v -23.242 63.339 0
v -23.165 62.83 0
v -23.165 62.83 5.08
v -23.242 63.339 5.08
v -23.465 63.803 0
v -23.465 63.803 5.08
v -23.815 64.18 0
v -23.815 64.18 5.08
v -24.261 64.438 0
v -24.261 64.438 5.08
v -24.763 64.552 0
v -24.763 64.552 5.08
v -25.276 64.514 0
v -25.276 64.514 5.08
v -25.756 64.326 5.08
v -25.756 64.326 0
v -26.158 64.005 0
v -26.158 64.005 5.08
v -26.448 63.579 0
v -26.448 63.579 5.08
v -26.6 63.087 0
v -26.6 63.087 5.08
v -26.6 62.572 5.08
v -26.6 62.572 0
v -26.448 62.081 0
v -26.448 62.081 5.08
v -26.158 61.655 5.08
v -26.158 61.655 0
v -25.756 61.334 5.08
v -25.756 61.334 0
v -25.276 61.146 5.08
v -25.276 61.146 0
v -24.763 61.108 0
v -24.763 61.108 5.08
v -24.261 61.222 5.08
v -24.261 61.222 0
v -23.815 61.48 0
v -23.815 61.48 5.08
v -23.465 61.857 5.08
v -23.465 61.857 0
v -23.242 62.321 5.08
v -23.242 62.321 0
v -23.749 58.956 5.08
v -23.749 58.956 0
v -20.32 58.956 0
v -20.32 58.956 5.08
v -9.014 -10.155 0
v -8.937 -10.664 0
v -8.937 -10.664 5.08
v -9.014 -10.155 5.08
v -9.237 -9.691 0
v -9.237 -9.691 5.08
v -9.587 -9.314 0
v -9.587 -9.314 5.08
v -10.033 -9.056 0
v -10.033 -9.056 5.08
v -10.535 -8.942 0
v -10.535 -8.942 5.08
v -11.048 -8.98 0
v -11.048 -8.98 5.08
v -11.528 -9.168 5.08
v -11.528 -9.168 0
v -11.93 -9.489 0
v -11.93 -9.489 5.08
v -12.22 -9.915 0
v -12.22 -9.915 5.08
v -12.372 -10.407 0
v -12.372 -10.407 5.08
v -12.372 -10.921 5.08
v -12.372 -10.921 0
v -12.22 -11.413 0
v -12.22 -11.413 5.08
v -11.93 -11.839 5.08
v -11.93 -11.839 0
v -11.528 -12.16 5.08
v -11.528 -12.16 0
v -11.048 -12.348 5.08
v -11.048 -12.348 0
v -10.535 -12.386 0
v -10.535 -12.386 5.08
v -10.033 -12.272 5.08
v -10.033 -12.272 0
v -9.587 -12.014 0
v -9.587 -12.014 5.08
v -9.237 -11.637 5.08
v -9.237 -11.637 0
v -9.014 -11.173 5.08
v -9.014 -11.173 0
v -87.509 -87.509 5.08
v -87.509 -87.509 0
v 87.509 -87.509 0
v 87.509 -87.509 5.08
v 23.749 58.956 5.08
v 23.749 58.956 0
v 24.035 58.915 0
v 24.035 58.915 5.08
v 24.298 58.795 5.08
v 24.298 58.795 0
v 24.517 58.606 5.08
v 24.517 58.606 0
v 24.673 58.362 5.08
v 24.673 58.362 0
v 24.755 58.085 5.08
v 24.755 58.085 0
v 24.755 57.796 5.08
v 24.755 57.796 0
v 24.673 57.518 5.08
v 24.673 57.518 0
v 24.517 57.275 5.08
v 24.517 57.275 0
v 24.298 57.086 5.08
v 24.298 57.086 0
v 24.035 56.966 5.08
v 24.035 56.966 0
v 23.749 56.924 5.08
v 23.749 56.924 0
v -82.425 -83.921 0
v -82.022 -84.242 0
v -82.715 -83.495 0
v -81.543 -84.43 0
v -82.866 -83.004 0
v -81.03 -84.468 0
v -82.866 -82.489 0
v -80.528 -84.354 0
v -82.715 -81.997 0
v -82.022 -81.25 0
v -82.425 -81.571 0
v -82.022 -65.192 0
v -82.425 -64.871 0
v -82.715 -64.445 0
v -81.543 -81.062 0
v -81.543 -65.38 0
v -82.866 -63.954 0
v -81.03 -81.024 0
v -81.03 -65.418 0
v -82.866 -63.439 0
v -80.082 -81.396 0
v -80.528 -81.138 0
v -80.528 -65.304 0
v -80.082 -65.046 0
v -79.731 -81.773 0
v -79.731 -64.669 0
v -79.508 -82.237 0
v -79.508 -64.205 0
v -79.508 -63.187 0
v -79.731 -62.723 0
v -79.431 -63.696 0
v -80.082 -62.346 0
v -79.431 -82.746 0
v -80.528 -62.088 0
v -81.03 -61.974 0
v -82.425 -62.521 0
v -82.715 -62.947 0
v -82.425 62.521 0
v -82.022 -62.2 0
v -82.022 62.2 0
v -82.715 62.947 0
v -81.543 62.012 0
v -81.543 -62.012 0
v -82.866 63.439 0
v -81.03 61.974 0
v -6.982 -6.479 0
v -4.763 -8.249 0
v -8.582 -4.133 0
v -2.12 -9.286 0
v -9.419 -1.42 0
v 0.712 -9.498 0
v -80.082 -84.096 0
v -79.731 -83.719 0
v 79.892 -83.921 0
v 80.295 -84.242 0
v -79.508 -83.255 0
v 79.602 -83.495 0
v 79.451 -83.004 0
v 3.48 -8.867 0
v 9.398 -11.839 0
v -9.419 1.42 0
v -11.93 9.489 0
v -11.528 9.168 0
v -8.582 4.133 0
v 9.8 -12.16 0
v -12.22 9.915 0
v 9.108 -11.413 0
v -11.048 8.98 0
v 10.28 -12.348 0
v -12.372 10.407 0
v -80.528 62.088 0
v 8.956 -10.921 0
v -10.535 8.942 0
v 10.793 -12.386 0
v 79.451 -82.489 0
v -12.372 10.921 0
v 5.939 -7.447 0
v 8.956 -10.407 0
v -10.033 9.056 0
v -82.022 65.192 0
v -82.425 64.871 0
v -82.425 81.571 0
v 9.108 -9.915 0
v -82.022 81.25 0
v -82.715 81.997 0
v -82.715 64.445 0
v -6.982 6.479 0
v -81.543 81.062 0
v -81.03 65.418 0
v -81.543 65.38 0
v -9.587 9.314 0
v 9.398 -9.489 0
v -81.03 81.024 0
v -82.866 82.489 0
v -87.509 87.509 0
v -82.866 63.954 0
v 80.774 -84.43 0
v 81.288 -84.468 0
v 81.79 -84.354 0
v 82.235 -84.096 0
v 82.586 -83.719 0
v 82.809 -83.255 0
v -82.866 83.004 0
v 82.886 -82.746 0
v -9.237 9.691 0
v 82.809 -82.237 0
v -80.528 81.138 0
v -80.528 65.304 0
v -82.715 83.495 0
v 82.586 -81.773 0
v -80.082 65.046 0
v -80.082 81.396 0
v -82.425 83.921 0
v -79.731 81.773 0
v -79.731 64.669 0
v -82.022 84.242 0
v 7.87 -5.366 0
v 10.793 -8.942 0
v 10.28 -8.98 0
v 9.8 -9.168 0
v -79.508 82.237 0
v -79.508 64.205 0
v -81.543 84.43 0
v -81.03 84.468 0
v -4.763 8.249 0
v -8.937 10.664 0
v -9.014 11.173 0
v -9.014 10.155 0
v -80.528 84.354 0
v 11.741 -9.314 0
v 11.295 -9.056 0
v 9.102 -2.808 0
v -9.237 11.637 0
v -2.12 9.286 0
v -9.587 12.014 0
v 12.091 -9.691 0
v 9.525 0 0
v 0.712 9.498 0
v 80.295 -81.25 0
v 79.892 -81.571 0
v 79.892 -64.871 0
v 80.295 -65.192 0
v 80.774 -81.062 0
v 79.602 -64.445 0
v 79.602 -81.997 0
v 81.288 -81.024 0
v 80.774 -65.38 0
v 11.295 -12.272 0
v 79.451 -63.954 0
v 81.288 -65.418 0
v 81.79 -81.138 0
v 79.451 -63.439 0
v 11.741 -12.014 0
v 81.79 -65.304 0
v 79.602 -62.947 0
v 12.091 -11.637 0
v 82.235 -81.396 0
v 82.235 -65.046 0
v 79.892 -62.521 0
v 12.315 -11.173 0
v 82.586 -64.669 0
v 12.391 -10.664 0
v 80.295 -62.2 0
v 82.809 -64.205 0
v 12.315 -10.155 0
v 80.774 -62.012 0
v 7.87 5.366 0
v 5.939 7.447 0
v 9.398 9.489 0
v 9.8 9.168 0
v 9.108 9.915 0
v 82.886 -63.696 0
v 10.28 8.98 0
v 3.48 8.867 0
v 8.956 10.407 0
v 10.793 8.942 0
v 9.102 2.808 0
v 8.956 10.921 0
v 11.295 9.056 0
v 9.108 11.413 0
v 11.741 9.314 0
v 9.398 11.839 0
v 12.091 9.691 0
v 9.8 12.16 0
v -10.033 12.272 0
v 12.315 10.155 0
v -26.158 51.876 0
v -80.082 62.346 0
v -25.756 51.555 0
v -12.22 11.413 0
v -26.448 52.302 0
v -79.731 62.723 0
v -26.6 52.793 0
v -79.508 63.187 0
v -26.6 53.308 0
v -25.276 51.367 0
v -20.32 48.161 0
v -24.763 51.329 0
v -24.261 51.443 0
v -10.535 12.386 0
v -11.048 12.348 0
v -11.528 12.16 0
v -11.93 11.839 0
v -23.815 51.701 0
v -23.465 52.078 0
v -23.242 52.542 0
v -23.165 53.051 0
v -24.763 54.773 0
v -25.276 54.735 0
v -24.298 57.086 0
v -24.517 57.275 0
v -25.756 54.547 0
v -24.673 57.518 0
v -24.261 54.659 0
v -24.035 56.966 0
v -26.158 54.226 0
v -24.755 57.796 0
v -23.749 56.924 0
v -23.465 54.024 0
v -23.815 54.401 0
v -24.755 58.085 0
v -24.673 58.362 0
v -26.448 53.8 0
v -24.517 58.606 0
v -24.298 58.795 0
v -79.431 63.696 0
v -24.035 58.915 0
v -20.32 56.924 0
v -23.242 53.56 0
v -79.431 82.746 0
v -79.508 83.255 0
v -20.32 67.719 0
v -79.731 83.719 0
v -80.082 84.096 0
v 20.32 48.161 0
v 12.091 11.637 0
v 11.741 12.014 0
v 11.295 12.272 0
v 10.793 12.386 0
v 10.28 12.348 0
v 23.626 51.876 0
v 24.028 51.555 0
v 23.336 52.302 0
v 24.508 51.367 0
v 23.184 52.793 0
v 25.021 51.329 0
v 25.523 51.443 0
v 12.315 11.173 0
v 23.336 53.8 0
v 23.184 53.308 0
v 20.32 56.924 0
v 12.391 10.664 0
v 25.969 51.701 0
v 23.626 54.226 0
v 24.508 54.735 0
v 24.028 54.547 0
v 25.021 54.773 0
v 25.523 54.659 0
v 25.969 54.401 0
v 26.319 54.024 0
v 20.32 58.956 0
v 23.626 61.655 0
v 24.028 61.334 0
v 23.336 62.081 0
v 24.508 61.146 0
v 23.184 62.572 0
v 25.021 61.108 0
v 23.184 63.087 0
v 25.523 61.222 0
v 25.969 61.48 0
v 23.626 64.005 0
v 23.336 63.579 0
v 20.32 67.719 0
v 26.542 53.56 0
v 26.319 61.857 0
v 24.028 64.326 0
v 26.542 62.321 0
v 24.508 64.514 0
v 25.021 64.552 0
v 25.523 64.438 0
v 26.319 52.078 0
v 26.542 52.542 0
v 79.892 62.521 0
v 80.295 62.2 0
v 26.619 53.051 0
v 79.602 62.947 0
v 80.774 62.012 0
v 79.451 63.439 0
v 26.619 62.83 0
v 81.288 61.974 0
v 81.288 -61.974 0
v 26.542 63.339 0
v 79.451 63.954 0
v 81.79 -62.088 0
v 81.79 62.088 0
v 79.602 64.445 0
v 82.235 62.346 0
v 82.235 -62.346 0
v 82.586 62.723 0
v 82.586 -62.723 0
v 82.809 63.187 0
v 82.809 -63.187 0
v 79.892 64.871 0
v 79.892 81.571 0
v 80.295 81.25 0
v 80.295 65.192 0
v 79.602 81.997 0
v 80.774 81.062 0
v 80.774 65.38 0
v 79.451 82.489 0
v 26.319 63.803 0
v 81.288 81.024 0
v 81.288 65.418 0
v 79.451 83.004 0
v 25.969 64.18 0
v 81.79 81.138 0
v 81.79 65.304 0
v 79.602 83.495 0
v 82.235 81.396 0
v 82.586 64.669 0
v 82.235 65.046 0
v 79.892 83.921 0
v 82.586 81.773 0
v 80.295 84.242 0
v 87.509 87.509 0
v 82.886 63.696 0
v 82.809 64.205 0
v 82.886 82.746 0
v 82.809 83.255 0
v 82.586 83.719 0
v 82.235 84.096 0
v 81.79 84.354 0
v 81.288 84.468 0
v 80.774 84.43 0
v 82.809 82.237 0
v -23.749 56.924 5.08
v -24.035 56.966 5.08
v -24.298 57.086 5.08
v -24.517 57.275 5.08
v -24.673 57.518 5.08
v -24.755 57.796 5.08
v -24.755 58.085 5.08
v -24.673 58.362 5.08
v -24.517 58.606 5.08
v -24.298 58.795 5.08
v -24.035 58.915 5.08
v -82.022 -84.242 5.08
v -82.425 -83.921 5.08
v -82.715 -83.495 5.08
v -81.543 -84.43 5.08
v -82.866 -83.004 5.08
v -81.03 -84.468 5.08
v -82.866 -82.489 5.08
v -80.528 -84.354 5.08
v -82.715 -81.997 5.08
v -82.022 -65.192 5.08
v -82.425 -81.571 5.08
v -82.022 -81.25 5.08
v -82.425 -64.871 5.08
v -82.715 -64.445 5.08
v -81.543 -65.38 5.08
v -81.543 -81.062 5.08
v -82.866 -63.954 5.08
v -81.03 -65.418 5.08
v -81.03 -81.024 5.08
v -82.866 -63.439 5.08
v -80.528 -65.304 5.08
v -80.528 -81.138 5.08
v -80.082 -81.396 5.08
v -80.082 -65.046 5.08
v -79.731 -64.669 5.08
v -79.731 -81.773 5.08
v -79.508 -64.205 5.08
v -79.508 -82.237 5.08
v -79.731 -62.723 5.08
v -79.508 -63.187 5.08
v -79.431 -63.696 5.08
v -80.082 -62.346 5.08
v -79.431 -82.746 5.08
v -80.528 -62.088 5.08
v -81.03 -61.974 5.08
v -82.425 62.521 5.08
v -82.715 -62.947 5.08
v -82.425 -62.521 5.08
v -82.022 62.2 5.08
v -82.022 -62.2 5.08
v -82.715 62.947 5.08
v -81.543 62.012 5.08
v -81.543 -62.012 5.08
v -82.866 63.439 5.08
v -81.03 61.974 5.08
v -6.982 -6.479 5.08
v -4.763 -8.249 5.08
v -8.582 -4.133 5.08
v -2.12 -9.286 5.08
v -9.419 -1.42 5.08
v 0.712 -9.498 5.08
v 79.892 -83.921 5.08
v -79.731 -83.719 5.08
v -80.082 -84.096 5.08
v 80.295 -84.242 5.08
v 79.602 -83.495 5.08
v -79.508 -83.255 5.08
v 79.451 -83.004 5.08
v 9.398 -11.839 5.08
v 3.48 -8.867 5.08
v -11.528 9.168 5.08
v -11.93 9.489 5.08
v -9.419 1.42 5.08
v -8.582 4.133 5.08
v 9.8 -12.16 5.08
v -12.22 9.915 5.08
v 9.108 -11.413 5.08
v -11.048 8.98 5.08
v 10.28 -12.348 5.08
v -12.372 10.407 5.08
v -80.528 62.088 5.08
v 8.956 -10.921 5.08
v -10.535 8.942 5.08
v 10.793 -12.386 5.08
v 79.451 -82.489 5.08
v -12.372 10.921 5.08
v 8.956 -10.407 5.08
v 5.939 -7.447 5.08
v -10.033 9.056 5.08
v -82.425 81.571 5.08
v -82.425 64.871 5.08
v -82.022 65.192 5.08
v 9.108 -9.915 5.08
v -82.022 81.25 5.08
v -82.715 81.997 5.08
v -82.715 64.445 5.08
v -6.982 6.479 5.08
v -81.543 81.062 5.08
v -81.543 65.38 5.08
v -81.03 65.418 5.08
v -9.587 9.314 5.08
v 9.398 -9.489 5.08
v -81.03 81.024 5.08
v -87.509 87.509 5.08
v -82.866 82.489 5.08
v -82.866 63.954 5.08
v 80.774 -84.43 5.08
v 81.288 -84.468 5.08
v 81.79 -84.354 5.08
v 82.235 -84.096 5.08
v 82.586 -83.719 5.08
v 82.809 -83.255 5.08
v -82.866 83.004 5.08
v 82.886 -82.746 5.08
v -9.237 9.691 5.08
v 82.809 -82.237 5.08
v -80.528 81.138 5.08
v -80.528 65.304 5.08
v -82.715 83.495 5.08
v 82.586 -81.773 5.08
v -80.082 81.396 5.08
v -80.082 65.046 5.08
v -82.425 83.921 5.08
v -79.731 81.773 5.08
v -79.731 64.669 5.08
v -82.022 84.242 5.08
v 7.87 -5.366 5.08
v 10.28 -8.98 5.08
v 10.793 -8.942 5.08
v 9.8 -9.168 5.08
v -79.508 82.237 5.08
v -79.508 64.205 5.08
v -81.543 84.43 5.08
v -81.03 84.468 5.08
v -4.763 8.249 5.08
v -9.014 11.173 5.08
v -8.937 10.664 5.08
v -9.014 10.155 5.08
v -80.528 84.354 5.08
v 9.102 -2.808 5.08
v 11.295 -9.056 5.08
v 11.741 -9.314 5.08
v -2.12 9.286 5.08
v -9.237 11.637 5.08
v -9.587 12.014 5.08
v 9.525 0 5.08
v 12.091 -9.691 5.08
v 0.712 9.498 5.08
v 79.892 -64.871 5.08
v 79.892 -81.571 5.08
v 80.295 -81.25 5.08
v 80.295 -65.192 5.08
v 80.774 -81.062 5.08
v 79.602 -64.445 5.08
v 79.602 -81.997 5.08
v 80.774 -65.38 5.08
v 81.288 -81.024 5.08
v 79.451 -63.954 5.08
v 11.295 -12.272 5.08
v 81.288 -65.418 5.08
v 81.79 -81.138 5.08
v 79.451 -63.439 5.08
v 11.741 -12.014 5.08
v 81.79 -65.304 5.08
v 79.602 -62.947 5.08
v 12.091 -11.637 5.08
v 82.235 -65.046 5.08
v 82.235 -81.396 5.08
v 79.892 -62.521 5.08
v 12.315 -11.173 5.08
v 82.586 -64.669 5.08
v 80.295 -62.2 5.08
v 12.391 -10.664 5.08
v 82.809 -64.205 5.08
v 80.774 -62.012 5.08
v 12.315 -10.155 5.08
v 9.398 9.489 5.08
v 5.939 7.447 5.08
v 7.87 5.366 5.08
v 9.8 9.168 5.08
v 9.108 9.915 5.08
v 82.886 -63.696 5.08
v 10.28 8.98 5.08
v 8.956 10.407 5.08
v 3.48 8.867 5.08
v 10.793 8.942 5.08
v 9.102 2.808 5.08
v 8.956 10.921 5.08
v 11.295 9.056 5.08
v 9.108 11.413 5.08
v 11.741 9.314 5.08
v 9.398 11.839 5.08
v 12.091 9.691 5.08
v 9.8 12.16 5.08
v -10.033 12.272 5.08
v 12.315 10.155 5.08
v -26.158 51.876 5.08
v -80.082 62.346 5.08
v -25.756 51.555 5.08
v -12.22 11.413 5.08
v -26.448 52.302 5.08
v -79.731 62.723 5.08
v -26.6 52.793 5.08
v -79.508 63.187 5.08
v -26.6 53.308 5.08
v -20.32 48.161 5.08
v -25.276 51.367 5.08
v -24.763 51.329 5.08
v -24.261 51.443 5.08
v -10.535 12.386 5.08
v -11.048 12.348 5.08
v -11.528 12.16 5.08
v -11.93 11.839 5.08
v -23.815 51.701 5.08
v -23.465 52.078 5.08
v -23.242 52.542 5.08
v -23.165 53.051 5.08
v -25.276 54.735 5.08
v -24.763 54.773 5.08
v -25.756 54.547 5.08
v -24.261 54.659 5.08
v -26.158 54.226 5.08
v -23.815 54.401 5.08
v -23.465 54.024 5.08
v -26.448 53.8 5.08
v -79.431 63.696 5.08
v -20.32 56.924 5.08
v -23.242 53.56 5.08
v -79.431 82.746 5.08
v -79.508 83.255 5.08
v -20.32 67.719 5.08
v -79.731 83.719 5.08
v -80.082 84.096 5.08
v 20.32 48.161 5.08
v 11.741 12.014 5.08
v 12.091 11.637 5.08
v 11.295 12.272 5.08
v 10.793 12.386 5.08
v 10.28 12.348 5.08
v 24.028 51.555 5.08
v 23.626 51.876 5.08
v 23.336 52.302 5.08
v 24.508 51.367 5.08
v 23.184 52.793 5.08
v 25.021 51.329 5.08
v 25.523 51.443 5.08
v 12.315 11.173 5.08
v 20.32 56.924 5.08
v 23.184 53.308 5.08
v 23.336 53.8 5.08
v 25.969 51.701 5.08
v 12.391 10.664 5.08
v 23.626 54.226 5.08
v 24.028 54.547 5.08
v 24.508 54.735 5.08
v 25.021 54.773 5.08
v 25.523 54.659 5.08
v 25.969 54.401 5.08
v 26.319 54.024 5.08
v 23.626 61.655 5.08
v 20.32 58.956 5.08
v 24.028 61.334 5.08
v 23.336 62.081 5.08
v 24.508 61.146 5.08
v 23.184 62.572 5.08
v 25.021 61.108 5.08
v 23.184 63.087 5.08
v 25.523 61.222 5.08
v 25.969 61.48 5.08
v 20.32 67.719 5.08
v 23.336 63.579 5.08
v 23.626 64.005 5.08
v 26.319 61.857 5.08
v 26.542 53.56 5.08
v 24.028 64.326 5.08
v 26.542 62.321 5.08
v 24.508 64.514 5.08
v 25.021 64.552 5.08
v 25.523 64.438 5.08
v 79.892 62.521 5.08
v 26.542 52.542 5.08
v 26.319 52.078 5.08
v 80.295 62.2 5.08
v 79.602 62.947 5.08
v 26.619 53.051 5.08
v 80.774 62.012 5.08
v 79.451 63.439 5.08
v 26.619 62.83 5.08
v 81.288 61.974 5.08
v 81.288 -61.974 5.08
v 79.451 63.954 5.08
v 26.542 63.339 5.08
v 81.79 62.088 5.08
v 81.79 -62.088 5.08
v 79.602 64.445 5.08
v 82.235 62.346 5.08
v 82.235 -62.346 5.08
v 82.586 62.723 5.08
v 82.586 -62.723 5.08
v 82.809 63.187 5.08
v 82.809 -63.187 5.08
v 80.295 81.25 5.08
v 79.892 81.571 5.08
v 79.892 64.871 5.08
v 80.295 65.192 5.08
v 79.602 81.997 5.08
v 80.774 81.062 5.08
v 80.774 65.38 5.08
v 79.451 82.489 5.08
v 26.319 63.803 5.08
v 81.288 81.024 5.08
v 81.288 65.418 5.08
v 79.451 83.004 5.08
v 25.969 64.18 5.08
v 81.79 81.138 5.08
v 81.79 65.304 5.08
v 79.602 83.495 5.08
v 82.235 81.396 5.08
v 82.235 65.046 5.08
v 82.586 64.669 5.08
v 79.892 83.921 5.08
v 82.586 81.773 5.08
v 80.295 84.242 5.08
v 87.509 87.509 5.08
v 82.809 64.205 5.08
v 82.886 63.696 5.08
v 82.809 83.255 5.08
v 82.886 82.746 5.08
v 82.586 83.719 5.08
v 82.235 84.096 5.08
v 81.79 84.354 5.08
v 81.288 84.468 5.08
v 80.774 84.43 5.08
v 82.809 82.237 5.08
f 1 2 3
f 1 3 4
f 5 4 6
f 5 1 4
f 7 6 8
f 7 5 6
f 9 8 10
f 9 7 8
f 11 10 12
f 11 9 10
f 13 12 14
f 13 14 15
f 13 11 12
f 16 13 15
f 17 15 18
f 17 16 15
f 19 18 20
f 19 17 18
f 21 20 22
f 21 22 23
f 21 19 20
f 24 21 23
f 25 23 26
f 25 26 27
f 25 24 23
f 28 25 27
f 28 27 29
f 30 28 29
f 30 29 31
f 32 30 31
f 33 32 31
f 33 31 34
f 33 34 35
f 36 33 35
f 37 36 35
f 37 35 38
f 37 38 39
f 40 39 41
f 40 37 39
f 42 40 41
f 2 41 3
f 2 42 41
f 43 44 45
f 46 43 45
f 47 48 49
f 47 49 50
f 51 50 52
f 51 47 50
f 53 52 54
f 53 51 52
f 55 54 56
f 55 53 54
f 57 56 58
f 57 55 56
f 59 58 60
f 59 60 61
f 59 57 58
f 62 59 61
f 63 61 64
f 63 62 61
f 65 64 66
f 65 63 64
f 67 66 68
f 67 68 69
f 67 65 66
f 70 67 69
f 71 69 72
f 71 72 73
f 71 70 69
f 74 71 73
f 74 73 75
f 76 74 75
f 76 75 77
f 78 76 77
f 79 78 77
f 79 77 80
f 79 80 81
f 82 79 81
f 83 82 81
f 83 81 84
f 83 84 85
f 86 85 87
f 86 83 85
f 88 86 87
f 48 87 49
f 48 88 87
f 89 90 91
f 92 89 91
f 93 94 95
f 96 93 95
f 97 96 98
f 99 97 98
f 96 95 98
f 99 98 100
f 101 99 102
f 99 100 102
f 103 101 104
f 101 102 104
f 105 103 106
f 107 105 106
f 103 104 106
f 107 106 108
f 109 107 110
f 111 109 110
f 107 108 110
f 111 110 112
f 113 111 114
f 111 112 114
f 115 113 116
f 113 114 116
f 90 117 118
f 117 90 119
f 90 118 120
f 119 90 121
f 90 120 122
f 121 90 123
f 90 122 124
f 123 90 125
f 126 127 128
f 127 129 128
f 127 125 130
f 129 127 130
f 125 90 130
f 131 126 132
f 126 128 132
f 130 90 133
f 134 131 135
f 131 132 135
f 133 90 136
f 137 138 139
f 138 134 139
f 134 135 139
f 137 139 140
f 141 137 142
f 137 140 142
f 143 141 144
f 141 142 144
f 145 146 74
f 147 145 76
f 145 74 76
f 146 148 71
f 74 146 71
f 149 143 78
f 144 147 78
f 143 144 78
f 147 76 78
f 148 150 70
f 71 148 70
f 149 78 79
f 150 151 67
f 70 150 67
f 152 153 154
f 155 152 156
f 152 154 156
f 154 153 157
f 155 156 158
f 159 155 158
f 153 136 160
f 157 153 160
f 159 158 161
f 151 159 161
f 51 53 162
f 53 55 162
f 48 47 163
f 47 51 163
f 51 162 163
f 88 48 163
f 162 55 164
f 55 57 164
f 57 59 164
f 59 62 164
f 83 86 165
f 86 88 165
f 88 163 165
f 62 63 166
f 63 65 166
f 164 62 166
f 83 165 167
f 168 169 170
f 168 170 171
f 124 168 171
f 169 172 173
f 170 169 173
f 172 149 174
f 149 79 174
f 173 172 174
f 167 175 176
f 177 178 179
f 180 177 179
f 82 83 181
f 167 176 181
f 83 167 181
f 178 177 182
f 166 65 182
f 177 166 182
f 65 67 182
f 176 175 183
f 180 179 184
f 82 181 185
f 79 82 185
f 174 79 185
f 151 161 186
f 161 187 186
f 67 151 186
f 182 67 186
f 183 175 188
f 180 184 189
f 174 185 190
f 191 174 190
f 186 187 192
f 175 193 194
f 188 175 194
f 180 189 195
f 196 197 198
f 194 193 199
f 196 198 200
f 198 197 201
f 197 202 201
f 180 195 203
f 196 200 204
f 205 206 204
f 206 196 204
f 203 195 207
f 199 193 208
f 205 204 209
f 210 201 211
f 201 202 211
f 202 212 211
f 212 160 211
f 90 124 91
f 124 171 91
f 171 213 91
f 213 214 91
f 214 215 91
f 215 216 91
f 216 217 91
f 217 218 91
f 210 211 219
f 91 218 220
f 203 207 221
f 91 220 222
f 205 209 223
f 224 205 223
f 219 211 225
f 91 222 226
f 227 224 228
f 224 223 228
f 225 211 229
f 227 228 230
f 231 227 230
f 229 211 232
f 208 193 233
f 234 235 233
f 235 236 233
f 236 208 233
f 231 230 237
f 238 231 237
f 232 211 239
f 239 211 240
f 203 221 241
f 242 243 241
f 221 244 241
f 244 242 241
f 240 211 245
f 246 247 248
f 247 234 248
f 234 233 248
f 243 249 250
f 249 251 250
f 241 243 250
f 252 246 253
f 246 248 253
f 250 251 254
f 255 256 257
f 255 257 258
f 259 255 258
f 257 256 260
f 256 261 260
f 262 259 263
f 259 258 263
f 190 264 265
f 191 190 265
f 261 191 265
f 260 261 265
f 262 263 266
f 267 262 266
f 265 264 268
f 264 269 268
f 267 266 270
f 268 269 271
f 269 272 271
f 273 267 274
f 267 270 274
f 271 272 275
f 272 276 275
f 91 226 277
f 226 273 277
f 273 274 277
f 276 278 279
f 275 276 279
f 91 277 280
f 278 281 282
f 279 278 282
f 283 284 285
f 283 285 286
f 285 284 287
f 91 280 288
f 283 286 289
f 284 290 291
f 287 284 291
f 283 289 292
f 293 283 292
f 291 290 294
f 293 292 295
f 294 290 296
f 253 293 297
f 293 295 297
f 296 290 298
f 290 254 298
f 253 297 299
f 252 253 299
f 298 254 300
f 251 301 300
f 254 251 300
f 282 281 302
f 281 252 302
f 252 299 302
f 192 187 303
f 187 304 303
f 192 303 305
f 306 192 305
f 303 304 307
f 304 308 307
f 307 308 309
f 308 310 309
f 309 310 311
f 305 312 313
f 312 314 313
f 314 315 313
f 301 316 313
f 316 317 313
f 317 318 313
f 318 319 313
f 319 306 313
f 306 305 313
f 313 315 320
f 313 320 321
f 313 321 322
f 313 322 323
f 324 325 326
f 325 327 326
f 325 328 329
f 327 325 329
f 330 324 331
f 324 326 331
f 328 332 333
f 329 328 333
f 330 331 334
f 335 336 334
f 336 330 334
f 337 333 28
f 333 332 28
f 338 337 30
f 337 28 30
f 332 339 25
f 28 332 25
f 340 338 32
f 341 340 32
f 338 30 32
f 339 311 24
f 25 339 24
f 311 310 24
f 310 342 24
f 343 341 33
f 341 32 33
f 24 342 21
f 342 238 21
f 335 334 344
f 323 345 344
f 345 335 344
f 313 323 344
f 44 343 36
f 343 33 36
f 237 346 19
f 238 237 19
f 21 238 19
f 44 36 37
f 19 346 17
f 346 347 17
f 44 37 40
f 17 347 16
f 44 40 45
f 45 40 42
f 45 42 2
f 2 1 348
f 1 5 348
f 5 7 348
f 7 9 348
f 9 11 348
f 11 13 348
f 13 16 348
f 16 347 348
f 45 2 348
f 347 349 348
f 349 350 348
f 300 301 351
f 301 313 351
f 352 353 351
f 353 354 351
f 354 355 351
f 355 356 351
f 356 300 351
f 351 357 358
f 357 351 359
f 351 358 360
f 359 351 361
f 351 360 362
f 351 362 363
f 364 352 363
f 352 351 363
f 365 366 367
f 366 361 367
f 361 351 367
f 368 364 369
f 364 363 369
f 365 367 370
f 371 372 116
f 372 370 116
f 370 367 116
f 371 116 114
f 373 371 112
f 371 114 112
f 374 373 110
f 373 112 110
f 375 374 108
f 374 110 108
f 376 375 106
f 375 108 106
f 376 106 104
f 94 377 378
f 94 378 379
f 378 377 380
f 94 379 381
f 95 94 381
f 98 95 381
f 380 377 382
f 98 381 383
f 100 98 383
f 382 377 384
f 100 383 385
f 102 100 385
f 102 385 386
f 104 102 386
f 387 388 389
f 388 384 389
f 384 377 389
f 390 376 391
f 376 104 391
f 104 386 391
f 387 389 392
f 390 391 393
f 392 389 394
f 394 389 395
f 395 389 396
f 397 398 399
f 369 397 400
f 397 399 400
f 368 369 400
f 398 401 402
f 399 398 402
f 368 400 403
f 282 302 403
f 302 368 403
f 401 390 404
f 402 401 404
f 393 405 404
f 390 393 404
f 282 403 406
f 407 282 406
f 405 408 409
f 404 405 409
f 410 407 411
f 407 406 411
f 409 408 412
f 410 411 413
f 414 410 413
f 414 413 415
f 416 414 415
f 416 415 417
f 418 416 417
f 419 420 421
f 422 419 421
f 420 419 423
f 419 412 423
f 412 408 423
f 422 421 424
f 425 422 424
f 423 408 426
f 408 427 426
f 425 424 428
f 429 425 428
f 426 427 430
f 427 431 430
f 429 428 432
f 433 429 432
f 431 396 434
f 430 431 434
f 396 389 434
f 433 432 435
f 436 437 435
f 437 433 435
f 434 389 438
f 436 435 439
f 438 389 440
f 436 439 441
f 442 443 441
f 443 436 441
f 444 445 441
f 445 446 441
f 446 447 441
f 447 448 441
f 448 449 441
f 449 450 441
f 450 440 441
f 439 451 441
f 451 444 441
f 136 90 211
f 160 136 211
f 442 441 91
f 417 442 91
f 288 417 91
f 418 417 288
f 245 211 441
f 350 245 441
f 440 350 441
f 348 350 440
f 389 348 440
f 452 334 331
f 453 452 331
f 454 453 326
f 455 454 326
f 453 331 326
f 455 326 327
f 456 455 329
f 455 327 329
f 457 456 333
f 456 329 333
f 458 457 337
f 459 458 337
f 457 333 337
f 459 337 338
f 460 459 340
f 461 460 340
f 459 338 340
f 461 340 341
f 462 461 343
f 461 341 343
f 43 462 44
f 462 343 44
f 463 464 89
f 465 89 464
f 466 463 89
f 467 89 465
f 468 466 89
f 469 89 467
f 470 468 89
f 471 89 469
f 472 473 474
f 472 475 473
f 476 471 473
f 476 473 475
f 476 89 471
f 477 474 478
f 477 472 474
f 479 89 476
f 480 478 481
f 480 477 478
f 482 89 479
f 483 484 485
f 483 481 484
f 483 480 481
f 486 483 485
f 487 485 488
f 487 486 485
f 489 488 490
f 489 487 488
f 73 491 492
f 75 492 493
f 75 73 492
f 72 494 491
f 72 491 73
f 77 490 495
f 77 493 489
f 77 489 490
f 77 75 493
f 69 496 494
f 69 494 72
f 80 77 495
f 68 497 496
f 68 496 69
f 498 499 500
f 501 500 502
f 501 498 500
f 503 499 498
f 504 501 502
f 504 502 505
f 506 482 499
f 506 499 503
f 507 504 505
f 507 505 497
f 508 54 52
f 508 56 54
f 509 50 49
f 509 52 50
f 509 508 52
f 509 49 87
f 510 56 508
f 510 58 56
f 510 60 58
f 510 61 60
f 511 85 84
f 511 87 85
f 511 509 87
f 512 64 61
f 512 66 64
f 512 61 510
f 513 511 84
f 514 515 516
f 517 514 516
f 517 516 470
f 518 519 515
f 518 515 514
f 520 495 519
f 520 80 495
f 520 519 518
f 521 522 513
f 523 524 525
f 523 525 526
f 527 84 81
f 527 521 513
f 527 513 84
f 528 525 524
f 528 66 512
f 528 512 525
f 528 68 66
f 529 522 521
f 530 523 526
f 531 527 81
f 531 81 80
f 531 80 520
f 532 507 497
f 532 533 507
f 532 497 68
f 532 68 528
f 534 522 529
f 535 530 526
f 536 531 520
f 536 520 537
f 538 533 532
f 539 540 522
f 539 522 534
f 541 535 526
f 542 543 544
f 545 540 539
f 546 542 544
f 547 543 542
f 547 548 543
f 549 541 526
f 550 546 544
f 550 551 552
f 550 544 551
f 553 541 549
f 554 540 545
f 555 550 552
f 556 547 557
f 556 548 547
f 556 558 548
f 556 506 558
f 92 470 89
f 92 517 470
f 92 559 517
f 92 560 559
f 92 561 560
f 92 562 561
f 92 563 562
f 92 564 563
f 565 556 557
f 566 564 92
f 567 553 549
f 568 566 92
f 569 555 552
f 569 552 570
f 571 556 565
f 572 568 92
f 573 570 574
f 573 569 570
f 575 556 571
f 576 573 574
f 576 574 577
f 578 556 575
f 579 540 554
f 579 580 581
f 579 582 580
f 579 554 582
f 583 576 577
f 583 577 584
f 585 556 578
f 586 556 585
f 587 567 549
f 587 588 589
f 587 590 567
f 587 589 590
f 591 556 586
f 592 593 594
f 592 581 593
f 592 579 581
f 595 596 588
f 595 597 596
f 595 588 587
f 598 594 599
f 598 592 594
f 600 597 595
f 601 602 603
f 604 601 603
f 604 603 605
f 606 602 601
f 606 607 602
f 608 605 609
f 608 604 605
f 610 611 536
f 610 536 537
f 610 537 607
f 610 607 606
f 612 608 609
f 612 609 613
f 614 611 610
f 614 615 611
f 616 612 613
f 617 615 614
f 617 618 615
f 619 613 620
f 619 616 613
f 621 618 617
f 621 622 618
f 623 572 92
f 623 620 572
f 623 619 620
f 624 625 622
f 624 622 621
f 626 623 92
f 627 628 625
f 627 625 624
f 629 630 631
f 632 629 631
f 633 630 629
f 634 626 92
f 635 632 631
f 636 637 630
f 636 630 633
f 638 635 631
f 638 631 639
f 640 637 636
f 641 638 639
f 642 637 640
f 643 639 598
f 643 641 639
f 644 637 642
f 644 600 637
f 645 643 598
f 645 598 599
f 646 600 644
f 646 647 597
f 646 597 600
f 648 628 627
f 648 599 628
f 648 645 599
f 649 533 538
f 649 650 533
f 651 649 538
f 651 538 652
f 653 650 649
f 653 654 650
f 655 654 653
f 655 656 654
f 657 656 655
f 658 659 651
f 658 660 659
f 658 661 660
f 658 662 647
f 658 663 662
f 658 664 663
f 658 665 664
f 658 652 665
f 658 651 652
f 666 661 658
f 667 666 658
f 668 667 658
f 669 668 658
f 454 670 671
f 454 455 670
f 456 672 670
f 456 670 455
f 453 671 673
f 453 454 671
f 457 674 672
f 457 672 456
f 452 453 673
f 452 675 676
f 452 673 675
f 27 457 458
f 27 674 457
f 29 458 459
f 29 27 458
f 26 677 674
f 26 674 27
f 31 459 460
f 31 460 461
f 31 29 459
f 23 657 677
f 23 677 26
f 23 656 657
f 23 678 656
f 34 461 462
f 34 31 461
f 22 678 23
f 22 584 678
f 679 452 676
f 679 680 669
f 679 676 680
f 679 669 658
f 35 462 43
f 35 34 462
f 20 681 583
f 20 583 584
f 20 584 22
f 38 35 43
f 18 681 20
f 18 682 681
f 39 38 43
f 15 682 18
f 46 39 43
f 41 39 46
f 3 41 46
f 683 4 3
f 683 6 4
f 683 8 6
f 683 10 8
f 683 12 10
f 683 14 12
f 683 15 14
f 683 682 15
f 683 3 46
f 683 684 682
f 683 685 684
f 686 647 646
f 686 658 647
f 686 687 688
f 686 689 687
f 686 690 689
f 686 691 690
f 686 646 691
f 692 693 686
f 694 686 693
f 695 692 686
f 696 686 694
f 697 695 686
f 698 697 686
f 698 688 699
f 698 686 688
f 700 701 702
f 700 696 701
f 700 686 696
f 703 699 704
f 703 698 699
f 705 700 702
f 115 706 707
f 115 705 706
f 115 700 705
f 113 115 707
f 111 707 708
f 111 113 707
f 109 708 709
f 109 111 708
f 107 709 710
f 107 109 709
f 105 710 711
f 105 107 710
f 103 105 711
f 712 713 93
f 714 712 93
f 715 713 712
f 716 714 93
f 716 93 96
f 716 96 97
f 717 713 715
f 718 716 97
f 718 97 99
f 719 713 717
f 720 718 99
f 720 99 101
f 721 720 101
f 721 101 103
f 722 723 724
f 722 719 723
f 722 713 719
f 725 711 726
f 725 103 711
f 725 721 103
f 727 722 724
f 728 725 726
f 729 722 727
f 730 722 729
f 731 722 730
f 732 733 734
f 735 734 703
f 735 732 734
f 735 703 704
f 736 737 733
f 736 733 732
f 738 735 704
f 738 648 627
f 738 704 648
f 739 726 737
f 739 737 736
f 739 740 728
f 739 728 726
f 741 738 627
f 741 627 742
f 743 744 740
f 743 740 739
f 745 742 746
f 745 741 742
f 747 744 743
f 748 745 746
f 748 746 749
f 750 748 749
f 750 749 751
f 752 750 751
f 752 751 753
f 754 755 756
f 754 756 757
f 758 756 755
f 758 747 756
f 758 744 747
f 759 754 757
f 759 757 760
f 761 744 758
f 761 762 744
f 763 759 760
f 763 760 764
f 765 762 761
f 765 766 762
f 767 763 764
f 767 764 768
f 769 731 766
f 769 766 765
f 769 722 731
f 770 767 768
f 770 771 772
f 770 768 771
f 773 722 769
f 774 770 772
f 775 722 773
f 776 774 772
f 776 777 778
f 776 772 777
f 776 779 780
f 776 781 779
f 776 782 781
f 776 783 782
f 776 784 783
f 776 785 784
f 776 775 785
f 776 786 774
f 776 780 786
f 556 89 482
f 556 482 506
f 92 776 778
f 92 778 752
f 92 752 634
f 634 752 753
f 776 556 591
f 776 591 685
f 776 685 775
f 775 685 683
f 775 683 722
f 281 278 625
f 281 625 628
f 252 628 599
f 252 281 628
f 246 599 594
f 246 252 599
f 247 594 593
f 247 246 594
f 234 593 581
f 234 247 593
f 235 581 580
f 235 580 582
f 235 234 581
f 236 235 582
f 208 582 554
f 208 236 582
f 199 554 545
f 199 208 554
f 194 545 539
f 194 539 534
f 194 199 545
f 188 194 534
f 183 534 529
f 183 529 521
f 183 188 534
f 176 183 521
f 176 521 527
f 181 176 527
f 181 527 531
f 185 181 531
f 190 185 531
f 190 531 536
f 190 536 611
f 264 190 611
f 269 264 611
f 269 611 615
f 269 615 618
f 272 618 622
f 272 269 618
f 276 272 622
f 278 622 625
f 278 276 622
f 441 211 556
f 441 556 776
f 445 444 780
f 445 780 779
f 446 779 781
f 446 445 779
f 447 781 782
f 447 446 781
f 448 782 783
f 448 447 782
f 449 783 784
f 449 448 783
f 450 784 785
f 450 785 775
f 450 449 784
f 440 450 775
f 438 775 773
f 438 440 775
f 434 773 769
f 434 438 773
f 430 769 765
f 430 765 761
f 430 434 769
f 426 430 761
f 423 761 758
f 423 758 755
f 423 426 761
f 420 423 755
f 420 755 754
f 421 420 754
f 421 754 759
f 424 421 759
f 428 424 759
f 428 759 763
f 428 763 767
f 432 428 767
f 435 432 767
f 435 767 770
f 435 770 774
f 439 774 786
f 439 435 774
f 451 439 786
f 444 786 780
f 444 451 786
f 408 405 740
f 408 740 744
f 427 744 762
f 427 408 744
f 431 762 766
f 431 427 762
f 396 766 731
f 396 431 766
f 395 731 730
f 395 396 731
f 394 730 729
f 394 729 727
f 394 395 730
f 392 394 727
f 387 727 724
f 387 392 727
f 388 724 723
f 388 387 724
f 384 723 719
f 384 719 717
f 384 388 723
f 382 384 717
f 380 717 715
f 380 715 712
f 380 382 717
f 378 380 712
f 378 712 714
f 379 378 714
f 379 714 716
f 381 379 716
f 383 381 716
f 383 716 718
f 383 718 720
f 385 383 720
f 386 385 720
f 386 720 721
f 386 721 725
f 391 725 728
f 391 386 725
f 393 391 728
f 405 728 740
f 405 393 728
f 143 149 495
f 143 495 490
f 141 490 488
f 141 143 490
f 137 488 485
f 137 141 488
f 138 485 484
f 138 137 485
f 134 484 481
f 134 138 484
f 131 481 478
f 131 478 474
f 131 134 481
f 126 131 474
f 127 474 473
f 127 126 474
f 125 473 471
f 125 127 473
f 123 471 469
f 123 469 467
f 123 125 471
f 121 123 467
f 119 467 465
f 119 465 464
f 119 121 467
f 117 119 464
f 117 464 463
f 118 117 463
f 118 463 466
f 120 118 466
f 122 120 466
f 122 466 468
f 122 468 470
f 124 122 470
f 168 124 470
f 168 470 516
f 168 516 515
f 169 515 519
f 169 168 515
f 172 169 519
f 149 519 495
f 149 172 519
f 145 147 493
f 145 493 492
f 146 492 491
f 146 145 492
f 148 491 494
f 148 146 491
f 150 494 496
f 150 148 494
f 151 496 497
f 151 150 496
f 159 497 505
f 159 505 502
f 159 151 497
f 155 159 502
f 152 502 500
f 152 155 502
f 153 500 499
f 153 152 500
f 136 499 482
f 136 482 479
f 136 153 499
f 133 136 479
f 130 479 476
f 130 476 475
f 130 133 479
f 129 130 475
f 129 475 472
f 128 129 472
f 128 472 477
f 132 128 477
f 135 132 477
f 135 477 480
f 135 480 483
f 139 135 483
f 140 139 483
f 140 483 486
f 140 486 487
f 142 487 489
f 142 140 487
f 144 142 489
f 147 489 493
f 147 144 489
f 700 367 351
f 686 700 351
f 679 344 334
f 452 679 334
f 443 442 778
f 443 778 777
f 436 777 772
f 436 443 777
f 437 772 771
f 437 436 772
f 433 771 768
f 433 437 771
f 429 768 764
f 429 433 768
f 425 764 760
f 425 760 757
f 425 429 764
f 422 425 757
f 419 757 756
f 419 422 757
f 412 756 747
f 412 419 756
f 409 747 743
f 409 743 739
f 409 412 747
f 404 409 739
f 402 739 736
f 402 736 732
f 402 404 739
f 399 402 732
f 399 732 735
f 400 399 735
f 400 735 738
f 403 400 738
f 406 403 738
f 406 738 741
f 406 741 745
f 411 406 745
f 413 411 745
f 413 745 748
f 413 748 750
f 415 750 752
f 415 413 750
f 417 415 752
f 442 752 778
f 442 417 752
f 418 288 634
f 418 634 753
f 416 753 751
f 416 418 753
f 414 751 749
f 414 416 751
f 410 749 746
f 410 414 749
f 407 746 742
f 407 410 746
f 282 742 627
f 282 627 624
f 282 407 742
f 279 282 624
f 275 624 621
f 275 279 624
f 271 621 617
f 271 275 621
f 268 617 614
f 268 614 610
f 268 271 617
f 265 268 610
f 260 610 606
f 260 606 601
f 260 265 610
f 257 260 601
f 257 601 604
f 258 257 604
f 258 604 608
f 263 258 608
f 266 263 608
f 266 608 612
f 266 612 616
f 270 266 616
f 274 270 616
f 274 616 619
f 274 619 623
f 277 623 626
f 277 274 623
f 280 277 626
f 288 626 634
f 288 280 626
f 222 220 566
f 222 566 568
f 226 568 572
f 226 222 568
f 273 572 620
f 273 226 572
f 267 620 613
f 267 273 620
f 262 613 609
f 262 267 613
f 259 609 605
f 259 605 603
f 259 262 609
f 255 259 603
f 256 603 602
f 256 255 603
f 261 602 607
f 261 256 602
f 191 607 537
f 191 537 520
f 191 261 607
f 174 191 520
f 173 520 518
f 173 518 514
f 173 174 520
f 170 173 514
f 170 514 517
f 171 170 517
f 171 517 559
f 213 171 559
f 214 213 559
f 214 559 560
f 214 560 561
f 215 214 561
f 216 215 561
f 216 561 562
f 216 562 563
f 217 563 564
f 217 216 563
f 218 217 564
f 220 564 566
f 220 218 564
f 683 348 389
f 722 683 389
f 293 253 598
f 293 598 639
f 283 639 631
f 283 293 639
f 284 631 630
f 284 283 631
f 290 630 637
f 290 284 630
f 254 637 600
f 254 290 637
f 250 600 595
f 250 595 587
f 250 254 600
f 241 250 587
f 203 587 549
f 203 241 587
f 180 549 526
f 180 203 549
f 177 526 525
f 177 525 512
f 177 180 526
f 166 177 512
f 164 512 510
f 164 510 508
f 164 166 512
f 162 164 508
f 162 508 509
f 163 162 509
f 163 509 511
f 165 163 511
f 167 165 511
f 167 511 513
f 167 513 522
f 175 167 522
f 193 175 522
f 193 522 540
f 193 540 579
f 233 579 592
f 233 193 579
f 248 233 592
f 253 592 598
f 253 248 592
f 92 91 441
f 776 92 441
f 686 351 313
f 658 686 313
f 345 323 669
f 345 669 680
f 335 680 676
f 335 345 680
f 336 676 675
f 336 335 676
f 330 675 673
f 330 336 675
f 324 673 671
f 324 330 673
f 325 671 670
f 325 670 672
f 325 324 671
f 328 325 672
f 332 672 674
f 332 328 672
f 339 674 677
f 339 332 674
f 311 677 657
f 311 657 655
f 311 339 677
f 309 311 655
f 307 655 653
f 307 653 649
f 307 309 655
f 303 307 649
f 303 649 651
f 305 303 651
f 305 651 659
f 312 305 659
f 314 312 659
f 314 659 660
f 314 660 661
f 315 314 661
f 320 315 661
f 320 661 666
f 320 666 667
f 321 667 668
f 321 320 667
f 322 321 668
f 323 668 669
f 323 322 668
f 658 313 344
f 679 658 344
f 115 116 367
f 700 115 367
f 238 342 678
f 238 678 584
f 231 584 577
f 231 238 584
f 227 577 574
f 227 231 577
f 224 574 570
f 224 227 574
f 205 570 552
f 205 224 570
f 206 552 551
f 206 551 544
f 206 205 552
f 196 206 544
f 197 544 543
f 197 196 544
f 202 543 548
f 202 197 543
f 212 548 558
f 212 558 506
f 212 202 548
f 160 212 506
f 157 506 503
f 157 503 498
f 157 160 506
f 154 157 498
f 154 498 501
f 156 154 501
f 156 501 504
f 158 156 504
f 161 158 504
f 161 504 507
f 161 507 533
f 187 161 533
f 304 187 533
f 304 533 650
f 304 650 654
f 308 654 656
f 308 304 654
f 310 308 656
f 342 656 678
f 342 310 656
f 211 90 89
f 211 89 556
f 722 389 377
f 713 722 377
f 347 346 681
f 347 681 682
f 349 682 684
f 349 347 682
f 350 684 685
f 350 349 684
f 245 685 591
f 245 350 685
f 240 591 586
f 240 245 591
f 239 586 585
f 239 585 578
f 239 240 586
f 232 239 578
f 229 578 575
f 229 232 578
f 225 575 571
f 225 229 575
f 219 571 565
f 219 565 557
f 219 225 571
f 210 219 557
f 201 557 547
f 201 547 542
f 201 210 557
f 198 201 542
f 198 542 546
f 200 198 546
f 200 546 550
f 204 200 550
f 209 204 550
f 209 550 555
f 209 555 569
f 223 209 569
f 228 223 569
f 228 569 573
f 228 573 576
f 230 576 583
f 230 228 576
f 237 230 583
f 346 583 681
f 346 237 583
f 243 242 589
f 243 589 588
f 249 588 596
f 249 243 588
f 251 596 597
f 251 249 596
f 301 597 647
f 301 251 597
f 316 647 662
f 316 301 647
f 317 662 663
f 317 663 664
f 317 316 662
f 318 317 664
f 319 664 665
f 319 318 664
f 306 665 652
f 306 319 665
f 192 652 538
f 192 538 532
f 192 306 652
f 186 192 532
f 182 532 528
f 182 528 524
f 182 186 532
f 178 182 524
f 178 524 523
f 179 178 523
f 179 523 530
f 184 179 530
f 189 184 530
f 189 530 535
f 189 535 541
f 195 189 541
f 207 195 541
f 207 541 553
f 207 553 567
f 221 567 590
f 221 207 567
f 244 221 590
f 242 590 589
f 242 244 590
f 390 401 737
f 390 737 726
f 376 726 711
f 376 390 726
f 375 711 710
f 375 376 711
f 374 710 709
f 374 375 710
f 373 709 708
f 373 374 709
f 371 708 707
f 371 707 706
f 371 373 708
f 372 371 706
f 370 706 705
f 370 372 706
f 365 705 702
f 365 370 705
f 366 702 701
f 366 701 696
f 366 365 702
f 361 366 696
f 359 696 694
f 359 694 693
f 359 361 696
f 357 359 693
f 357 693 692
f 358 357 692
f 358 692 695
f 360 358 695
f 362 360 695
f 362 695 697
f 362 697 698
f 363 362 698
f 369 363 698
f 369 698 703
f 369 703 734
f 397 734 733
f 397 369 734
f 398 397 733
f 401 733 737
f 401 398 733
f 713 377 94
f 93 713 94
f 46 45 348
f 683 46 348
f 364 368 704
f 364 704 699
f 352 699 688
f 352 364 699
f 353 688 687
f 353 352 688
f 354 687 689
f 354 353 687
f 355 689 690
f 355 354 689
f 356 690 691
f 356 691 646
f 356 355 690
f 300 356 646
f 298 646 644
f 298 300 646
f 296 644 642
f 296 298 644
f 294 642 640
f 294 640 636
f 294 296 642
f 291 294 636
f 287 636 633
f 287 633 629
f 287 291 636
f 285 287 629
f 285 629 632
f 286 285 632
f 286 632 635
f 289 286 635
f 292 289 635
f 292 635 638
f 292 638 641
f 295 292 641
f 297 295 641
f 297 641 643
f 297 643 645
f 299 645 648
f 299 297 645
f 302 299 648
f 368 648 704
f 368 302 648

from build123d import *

# Parameters (mm, degrees)
F0_W     = 175.017152
F0_H     = 175.017152
F0_R     = 1.7272
F0_R_2   = 9.525
F1_DEPTH = 5.08


with BuildPart() as f1:
    # F0 (on Top) → F1 (new body)
    with BuildSketch(Plane.XY):
        Rectangle(F0_W, F0_H)
        with Locations((-81.158576, -82.746076)):
            Circle(F0_R, mode=Mode.SUBTRACT)
        with Locations((-81.158576, -63.696076)):
            Circle(F0_R, mode=Mode.SUBTRACT)
        with Locations((-10.664054, -10.664054)):
            Circle(F0_R, mode=Mode.SUBTRACT)
        with Locations((81.158576, -82.746076)):
            Circle(F0_R, mode=Mode.SUBTRACT)
        with Locations((81.158576, -63.696076)):
            Circle(F0_R, mode=Mode.SUBTRACT)
        with Locations((10.664054, -10.664054)):
            Circle(F0_R, mode=Mode.SUBTRACT)
        with Locations((-10.664054, 10.664054)):
            Circle(F0_R, mode=Mode.SUBTRACT)
        with Locations((-81.158576, 63.696076)):
            Circle(F0_R, mode=Mode.SUBTRACT)
        with Locations((-81.158576, 82.746076)):
            Circle(F0_R, mode=Mode.SUBTRACT)
        with Locations((-24.892, 53.050918)):
            Circle(F0_R, mode=Mode.SUBTRACT)
        with Locations((-24.892, 62.829918)):
            Circle(F0_R, mode=Mode.SUBTRACT)
        Circle(F0_R_2, mode=Mode.SUBTRACT)
        with Locations((10.664054, 10.664054)):
            Circle(F0_R, mode=Mode.SUBTRACT)
        with BuildLine():
            Line((-20.32, 58.956418), (-20.32, 67.719418))
            Line((-20.32, 67.719418), (20.32, 67.719418))
            Line((20.32, 67.719418), (20.32, 58.956418))
            Line((20.32, 58.956418), (23.749, 58.956418))
            ThreePointArc((23.749, 58.956418), (24.765, 57.940418), (23.749, 56.924418))
            Line((23.749, 56.924418), (20.32, 56.924418))
            Line((20.32, 56.924418), (20.32, 48.161418))
            Line((20.32, 48.161418), (-20.32, 48.161418))
            Line((-20.32, 48.161418), (-20.32, 56.924418))
            Line((-20.32, 56.924418), (-23.749, 56.924418))
            ThreePointArc((-23.749, 56.924418), (-24.765, 57.940418), (-23.749, 58.956418))
            Line((-23.749, 58.956418), (-20.32, 58.956418))
        make_face(mode=Mode.SUBTRACT)
        with Locations((24.892, 53.050918)):
            Circle(F0_R, mode=Mode.SUBTRACT)
        with Locations((24.892, 62.829918)):
            Circle(F0_R, mode=Mode.SUBTRACT)
        with Locations((81.158576, 63.696076)):
            Circle(F0_R, mode=Mode.SUBTRACT)
        with Locations((81.158576, 82.746076)):
            Circle(F0_R, mode=Mode.SUBTRACT)
    extrude(amount=F1_DEPTH)


solid = f1.part
